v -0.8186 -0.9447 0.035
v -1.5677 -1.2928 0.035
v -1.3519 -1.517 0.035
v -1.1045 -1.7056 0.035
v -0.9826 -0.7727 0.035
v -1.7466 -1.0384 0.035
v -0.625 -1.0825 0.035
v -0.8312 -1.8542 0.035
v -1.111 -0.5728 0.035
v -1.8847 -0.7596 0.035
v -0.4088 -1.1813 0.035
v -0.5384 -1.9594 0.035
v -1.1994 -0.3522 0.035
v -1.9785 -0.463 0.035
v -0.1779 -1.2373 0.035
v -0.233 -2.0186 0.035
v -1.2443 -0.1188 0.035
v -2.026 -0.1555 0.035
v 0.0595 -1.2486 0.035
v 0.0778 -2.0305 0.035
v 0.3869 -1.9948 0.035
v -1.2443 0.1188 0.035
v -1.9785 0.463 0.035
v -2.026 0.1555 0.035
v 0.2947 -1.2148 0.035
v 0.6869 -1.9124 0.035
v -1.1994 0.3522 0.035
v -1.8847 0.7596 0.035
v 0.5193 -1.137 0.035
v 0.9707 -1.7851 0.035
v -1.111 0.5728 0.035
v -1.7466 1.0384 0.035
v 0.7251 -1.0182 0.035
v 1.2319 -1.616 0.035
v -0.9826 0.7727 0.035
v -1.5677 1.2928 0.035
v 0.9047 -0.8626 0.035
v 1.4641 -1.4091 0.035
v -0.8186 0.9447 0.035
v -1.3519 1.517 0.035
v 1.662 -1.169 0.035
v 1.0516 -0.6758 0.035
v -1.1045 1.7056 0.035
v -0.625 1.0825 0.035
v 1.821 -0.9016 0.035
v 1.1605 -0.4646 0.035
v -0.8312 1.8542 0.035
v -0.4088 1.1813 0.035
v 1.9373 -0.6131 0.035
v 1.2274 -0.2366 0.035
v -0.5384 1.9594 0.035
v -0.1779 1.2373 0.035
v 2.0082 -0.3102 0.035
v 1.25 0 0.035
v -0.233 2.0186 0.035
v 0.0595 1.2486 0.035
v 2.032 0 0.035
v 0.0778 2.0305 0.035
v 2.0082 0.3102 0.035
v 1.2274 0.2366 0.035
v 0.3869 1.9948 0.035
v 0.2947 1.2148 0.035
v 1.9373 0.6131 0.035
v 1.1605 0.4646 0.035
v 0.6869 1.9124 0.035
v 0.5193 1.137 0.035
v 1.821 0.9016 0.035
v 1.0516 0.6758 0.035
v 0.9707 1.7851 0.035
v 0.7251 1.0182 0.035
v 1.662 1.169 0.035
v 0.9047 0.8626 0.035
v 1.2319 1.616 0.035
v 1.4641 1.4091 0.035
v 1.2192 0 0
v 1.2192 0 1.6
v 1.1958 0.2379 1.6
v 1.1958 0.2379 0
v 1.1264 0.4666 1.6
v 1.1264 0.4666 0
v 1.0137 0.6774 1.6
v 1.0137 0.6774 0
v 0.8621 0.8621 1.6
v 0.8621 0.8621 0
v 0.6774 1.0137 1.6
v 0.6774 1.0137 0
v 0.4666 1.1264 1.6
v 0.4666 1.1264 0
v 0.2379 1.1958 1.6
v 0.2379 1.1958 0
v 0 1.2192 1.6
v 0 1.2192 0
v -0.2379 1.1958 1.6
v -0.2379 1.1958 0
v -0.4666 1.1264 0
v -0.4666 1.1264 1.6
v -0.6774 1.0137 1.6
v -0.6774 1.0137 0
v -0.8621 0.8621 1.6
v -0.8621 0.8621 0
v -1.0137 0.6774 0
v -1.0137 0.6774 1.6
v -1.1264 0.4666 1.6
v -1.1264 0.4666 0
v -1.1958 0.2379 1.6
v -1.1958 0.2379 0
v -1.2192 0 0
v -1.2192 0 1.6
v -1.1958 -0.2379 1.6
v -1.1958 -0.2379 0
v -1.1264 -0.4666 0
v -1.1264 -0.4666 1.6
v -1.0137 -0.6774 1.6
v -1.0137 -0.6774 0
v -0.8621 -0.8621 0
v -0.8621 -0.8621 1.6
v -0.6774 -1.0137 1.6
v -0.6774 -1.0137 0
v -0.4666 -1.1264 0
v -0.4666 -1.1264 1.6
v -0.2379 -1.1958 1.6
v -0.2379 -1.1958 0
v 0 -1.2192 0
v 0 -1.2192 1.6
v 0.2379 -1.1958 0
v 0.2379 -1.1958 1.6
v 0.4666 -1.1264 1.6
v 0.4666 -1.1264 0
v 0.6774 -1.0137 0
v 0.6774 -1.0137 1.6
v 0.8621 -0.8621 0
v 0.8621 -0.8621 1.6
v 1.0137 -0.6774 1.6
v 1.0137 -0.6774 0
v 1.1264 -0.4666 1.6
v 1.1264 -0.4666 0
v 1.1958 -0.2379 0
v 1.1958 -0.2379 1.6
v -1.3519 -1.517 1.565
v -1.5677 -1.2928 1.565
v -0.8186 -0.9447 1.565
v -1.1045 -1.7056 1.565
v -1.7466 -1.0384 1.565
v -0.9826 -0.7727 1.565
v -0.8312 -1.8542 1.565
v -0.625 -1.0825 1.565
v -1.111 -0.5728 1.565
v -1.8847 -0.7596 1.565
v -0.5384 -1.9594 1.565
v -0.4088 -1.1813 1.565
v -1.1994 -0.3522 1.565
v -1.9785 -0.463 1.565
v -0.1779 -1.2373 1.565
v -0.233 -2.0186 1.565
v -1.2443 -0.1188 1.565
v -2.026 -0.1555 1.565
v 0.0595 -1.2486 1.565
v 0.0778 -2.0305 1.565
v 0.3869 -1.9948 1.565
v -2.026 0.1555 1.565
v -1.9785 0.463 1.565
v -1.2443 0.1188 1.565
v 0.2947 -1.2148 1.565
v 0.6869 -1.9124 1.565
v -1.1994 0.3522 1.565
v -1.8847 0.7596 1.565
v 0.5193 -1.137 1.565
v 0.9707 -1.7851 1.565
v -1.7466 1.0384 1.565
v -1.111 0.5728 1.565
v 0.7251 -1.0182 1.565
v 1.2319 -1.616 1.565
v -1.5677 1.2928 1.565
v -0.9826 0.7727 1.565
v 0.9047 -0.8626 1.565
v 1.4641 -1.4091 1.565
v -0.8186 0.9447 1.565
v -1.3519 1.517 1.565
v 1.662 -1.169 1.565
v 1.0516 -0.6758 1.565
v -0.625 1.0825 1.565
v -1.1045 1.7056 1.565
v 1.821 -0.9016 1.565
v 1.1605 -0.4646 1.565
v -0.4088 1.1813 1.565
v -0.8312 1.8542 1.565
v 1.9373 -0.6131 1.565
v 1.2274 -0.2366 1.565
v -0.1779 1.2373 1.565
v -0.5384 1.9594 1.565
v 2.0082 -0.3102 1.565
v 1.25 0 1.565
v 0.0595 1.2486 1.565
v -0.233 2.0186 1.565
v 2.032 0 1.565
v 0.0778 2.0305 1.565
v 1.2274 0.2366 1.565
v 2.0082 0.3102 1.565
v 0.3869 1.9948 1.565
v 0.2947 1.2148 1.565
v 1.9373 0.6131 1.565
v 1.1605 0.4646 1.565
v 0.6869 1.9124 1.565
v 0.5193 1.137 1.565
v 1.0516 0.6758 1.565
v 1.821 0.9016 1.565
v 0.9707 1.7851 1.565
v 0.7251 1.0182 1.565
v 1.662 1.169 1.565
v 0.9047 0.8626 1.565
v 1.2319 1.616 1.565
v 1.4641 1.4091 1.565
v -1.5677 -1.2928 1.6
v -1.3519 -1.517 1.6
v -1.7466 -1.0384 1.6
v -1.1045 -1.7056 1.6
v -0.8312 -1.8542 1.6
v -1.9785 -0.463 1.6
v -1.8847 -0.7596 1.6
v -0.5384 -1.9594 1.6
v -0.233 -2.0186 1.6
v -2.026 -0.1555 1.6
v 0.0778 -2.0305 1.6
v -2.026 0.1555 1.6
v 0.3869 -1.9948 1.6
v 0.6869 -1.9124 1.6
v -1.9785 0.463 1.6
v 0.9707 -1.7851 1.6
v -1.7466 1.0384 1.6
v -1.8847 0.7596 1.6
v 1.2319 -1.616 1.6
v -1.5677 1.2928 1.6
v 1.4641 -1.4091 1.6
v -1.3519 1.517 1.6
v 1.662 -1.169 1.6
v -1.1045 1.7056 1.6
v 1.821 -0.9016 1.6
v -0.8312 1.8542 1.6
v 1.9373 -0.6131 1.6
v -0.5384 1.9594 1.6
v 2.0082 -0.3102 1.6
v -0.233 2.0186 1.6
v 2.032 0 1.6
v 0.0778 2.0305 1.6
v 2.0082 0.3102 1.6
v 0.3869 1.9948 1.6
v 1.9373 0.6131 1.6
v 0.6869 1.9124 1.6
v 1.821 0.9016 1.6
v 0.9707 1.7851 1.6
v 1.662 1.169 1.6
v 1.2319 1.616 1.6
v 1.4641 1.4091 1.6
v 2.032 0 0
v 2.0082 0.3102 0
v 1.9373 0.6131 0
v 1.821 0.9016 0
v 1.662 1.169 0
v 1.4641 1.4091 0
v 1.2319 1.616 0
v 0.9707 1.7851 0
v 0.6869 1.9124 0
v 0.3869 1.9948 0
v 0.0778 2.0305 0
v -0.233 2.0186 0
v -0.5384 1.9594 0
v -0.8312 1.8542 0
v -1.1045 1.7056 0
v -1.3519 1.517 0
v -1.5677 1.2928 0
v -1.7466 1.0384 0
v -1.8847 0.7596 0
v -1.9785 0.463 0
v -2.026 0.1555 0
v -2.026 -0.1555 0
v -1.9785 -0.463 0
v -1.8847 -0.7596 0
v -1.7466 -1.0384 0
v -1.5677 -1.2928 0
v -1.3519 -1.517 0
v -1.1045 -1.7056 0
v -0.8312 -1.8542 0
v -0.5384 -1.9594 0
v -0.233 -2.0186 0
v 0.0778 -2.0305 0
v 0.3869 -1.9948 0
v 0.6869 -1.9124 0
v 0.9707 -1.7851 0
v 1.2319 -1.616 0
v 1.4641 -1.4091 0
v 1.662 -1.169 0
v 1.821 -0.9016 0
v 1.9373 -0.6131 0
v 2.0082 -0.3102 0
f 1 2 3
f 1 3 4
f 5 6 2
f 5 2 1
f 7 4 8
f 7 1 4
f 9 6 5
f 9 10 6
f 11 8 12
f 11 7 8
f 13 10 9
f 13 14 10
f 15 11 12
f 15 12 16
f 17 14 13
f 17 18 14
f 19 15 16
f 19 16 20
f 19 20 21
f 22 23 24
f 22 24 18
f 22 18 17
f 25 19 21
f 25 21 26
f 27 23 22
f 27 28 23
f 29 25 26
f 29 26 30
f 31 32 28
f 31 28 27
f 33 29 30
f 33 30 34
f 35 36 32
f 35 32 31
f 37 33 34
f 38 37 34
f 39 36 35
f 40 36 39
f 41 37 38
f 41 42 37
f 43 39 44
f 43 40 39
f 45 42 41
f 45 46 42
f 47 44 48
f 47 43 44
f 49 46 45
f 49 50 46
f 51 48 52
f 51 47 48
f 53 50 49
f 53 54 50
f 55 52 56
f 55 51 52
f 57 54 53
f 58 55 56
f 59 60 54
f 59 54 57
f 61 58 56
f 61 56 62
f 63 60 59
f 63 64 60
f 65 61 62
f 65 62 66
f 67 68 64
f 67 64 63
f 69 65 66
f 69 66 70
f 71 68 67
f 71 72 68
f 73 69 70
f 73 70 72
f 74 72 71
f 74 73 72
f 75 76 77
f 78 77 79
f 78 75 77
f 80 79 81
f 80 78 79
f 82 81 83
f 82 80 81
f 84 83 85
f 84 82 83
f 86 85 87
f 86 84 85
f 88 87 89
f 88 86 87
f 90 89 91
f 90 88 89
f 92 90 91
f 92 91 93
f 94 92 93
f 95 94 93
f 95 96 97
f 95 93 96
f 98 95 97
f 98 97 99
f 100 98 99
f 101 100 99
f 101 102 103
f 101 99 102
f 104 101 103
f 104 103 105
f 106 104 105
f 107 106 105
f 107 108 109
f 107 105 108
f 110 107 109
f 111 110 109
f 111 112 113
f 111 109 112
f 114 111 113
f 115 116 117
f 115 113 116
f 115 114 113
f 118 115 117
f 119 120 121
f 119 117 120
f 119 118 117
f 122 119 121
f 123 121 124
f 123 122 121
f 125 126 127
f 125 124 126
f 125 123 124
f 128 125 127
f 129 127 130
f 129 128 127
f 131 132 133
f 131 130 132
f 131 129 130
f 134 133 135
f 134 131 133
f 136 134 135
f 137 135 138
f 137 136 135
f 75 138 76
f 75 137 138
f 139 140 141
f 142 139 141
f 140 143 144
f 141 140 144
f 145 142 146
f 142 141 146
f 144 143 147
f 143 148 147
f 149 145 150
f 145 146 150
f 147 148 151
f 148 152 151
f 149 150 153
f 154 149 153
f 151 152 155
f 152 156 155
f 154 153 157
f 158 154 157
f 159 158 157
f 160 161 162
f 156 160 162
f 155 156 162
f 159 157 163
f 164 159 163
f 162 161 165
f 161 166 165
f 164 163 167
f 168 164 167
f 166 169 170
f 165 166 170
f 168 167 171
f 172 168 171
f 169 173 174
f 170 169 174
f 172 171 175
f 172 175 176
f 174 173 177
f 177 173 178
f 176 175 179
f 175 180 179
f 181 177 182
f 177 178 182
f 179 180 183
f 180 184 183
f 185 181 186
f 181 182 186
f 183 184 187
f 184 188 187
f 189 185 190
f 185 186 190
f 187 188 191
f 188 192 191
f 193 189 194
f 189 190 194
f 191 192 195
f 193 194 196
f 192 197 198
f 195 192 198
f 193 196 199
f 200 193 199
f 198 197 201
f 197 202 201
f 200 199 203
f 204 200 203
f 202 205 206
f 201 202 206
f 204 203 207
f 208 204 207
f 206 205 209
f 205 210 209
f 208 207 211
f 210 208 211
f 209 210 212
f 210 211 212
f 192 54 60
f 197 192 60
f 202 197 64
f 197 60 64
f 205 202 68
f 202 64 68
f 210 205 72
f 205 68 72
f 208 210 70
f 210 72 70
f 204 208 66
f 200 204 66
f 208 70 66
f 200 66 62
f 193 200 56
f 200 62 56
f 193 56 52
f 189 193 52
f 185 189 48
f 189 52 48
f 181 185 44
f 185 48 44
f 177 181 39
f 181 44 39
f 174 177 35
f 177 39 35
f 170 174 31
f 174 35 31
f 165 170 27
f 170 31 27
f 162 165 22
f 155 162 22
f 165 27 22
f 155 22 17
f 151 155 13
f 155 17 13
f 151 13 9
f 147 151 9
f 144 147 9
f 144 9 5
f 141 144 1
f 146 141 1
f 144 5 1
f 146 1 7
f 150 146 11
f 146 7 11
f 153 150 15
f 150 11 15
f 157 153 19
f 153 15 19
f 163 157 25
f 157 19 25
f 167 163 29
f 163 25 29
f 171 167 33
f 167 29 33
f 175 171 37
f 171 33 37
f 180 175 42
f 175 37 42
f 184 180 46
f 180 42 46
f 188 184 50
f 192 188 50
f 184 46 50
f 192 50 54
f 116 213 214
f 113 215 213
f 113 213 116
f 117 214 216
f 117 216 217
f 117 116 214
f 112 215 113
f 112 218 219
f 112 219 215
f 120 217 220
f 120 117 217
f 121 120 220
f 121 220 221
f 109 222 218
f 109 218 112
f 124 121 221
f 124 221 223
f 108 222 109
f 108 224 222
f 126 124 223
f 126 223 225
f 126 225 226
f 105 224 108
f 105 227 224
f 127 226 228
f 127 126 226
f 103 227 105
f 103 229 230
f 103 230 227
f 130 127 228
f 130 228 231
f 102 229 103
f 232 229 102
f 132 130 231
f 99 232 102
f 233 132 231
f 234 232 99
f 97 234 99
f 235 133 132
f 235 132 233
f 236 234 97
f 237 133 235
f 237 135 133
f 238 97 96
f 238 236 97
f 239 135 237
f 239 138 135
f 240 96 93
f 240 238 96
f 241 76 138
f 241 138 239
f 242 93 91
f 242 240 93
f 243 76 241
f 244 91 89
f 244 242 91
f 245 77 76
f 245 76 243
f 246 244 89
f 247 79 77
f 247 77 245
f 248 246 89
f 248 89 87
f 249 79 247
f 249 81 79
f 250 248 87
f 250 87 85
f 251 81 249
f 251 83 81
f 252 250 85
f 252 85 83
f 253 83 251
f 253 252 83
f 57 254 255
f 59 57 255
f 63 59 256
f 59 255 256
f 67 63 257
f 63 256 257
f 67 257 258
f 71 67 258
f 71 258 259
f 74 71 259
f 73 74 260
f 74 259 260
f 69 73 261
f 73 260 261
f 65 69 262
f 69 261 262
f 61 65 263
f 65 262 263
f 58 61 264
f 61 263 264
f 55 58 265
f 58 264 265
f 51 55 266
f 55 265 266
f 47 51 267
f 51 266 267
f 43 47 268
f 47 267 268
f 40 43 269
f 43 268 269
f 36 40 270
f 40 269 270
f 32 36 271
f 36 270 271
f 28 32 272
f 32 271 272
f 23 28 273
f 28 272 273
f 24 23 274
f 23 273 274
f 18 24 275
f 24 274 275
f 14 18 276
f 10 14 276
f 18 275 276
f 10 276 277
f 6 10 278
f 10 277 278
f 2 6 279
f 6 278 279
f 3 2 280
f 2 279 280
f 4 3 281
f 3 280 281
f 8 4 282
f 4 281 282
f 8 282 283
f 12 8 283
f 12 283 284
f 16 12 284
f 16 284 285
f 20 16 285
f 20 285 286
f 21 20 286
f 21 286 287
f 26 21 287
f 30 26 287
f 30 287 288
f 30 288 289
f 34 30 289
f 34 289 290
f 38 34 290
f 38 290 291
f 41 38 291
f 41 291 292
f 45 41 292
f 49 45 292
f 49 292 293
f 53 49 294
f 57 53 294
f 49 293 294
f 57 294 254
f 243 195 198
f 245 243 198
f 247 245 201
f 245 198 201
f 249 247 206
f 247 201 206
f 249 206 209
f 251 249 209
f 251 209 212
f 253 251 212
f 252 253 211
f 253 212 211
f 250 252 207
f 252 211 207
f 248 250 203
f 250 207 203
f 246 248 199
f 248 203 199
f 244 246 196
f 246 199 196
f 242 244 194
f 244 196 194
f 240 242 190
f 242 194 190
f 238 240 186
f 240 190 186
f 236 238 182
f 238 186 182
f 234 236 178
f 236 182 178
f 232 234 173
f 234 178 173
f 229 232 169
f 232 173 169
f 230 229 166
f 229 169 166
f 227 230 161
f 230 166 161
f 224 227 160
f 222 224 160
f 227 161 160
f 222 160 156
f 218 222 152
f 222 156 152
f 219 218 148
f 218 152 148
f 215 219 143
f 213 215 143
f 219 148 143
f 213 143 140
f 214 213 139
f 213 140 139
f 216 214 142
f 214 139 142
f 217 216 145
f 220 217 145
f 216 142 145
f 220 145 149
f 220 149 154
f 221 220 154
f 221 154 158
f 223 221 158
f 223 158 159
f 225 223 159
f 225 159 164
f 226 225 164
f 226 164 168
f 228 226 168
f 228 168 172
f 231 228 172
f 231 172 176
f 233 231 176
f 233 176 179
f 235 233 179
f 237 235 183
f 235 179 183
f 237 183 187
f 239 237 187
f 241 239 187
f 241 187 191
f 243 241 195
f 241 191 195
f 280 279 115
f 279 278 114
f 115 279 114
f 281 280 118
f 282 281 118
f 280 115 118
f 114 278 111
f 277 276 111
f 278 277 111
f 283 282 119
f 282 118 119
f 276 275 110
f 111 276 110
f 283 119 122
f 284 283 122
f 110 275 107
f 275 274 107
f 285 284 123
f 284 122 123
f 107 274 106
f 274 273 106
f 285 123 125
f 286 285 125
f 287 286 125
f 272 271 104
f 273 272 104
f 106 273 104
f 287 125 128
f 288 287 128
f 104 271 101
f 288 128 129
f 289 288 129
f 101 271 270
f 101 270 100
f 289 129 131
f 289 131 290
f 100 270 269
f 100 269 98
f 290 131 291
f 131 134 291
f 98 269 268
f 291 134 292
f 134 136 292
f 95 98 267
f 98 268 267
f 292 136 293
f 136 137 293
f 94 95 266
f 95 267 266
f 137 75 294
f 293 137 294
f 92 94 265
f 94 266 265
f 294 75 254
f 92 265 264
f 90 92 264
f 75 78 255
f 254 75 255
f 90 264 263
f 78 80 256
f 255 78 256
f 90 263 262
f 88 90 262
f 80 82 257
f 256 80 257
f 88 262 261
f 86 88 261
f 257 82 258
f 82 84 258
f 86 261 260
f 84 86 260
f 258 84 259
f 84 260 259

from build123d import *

# Parameters (mm, degrees)
F0_R     = 2.032
F1_DEPTH = 0.035
F2_R     = 1.25
F3_DEPTH = 1.53
F4_R     = 2.032
F5_DEPTH = 0.035
F6_R     = 1.2192
F7_DEPTH = 1.601


with BuildPart() as f1:
    # F0 (on Top) → F1 (new body)
    with BuildSketch(Plane.XY):
        Circle(F0_R)
    extrude(amount=F1_DEPTH)

    # F2 (on face) → F3 (join)
    with BuildSketch(Plane.XY.offset(0.035)):
        Circle(F2_R)
    extrude(amount=F3_DEPTH)

    # F4 (on face) → F5 (join)
    with BuildSketch(Plane.XY.offset(1.565)):
        Circle(F4_R)
    extrude(amount=F5_DEPTH)

    # F6 (on Top) → F7 (cut, through all)
    with BuildSketch(Plane.XY):
        Circle(F6_R)
    extrude(amount=F7_DEPTH, mode=Mode.SUBTRACT)


solid = f1.part
